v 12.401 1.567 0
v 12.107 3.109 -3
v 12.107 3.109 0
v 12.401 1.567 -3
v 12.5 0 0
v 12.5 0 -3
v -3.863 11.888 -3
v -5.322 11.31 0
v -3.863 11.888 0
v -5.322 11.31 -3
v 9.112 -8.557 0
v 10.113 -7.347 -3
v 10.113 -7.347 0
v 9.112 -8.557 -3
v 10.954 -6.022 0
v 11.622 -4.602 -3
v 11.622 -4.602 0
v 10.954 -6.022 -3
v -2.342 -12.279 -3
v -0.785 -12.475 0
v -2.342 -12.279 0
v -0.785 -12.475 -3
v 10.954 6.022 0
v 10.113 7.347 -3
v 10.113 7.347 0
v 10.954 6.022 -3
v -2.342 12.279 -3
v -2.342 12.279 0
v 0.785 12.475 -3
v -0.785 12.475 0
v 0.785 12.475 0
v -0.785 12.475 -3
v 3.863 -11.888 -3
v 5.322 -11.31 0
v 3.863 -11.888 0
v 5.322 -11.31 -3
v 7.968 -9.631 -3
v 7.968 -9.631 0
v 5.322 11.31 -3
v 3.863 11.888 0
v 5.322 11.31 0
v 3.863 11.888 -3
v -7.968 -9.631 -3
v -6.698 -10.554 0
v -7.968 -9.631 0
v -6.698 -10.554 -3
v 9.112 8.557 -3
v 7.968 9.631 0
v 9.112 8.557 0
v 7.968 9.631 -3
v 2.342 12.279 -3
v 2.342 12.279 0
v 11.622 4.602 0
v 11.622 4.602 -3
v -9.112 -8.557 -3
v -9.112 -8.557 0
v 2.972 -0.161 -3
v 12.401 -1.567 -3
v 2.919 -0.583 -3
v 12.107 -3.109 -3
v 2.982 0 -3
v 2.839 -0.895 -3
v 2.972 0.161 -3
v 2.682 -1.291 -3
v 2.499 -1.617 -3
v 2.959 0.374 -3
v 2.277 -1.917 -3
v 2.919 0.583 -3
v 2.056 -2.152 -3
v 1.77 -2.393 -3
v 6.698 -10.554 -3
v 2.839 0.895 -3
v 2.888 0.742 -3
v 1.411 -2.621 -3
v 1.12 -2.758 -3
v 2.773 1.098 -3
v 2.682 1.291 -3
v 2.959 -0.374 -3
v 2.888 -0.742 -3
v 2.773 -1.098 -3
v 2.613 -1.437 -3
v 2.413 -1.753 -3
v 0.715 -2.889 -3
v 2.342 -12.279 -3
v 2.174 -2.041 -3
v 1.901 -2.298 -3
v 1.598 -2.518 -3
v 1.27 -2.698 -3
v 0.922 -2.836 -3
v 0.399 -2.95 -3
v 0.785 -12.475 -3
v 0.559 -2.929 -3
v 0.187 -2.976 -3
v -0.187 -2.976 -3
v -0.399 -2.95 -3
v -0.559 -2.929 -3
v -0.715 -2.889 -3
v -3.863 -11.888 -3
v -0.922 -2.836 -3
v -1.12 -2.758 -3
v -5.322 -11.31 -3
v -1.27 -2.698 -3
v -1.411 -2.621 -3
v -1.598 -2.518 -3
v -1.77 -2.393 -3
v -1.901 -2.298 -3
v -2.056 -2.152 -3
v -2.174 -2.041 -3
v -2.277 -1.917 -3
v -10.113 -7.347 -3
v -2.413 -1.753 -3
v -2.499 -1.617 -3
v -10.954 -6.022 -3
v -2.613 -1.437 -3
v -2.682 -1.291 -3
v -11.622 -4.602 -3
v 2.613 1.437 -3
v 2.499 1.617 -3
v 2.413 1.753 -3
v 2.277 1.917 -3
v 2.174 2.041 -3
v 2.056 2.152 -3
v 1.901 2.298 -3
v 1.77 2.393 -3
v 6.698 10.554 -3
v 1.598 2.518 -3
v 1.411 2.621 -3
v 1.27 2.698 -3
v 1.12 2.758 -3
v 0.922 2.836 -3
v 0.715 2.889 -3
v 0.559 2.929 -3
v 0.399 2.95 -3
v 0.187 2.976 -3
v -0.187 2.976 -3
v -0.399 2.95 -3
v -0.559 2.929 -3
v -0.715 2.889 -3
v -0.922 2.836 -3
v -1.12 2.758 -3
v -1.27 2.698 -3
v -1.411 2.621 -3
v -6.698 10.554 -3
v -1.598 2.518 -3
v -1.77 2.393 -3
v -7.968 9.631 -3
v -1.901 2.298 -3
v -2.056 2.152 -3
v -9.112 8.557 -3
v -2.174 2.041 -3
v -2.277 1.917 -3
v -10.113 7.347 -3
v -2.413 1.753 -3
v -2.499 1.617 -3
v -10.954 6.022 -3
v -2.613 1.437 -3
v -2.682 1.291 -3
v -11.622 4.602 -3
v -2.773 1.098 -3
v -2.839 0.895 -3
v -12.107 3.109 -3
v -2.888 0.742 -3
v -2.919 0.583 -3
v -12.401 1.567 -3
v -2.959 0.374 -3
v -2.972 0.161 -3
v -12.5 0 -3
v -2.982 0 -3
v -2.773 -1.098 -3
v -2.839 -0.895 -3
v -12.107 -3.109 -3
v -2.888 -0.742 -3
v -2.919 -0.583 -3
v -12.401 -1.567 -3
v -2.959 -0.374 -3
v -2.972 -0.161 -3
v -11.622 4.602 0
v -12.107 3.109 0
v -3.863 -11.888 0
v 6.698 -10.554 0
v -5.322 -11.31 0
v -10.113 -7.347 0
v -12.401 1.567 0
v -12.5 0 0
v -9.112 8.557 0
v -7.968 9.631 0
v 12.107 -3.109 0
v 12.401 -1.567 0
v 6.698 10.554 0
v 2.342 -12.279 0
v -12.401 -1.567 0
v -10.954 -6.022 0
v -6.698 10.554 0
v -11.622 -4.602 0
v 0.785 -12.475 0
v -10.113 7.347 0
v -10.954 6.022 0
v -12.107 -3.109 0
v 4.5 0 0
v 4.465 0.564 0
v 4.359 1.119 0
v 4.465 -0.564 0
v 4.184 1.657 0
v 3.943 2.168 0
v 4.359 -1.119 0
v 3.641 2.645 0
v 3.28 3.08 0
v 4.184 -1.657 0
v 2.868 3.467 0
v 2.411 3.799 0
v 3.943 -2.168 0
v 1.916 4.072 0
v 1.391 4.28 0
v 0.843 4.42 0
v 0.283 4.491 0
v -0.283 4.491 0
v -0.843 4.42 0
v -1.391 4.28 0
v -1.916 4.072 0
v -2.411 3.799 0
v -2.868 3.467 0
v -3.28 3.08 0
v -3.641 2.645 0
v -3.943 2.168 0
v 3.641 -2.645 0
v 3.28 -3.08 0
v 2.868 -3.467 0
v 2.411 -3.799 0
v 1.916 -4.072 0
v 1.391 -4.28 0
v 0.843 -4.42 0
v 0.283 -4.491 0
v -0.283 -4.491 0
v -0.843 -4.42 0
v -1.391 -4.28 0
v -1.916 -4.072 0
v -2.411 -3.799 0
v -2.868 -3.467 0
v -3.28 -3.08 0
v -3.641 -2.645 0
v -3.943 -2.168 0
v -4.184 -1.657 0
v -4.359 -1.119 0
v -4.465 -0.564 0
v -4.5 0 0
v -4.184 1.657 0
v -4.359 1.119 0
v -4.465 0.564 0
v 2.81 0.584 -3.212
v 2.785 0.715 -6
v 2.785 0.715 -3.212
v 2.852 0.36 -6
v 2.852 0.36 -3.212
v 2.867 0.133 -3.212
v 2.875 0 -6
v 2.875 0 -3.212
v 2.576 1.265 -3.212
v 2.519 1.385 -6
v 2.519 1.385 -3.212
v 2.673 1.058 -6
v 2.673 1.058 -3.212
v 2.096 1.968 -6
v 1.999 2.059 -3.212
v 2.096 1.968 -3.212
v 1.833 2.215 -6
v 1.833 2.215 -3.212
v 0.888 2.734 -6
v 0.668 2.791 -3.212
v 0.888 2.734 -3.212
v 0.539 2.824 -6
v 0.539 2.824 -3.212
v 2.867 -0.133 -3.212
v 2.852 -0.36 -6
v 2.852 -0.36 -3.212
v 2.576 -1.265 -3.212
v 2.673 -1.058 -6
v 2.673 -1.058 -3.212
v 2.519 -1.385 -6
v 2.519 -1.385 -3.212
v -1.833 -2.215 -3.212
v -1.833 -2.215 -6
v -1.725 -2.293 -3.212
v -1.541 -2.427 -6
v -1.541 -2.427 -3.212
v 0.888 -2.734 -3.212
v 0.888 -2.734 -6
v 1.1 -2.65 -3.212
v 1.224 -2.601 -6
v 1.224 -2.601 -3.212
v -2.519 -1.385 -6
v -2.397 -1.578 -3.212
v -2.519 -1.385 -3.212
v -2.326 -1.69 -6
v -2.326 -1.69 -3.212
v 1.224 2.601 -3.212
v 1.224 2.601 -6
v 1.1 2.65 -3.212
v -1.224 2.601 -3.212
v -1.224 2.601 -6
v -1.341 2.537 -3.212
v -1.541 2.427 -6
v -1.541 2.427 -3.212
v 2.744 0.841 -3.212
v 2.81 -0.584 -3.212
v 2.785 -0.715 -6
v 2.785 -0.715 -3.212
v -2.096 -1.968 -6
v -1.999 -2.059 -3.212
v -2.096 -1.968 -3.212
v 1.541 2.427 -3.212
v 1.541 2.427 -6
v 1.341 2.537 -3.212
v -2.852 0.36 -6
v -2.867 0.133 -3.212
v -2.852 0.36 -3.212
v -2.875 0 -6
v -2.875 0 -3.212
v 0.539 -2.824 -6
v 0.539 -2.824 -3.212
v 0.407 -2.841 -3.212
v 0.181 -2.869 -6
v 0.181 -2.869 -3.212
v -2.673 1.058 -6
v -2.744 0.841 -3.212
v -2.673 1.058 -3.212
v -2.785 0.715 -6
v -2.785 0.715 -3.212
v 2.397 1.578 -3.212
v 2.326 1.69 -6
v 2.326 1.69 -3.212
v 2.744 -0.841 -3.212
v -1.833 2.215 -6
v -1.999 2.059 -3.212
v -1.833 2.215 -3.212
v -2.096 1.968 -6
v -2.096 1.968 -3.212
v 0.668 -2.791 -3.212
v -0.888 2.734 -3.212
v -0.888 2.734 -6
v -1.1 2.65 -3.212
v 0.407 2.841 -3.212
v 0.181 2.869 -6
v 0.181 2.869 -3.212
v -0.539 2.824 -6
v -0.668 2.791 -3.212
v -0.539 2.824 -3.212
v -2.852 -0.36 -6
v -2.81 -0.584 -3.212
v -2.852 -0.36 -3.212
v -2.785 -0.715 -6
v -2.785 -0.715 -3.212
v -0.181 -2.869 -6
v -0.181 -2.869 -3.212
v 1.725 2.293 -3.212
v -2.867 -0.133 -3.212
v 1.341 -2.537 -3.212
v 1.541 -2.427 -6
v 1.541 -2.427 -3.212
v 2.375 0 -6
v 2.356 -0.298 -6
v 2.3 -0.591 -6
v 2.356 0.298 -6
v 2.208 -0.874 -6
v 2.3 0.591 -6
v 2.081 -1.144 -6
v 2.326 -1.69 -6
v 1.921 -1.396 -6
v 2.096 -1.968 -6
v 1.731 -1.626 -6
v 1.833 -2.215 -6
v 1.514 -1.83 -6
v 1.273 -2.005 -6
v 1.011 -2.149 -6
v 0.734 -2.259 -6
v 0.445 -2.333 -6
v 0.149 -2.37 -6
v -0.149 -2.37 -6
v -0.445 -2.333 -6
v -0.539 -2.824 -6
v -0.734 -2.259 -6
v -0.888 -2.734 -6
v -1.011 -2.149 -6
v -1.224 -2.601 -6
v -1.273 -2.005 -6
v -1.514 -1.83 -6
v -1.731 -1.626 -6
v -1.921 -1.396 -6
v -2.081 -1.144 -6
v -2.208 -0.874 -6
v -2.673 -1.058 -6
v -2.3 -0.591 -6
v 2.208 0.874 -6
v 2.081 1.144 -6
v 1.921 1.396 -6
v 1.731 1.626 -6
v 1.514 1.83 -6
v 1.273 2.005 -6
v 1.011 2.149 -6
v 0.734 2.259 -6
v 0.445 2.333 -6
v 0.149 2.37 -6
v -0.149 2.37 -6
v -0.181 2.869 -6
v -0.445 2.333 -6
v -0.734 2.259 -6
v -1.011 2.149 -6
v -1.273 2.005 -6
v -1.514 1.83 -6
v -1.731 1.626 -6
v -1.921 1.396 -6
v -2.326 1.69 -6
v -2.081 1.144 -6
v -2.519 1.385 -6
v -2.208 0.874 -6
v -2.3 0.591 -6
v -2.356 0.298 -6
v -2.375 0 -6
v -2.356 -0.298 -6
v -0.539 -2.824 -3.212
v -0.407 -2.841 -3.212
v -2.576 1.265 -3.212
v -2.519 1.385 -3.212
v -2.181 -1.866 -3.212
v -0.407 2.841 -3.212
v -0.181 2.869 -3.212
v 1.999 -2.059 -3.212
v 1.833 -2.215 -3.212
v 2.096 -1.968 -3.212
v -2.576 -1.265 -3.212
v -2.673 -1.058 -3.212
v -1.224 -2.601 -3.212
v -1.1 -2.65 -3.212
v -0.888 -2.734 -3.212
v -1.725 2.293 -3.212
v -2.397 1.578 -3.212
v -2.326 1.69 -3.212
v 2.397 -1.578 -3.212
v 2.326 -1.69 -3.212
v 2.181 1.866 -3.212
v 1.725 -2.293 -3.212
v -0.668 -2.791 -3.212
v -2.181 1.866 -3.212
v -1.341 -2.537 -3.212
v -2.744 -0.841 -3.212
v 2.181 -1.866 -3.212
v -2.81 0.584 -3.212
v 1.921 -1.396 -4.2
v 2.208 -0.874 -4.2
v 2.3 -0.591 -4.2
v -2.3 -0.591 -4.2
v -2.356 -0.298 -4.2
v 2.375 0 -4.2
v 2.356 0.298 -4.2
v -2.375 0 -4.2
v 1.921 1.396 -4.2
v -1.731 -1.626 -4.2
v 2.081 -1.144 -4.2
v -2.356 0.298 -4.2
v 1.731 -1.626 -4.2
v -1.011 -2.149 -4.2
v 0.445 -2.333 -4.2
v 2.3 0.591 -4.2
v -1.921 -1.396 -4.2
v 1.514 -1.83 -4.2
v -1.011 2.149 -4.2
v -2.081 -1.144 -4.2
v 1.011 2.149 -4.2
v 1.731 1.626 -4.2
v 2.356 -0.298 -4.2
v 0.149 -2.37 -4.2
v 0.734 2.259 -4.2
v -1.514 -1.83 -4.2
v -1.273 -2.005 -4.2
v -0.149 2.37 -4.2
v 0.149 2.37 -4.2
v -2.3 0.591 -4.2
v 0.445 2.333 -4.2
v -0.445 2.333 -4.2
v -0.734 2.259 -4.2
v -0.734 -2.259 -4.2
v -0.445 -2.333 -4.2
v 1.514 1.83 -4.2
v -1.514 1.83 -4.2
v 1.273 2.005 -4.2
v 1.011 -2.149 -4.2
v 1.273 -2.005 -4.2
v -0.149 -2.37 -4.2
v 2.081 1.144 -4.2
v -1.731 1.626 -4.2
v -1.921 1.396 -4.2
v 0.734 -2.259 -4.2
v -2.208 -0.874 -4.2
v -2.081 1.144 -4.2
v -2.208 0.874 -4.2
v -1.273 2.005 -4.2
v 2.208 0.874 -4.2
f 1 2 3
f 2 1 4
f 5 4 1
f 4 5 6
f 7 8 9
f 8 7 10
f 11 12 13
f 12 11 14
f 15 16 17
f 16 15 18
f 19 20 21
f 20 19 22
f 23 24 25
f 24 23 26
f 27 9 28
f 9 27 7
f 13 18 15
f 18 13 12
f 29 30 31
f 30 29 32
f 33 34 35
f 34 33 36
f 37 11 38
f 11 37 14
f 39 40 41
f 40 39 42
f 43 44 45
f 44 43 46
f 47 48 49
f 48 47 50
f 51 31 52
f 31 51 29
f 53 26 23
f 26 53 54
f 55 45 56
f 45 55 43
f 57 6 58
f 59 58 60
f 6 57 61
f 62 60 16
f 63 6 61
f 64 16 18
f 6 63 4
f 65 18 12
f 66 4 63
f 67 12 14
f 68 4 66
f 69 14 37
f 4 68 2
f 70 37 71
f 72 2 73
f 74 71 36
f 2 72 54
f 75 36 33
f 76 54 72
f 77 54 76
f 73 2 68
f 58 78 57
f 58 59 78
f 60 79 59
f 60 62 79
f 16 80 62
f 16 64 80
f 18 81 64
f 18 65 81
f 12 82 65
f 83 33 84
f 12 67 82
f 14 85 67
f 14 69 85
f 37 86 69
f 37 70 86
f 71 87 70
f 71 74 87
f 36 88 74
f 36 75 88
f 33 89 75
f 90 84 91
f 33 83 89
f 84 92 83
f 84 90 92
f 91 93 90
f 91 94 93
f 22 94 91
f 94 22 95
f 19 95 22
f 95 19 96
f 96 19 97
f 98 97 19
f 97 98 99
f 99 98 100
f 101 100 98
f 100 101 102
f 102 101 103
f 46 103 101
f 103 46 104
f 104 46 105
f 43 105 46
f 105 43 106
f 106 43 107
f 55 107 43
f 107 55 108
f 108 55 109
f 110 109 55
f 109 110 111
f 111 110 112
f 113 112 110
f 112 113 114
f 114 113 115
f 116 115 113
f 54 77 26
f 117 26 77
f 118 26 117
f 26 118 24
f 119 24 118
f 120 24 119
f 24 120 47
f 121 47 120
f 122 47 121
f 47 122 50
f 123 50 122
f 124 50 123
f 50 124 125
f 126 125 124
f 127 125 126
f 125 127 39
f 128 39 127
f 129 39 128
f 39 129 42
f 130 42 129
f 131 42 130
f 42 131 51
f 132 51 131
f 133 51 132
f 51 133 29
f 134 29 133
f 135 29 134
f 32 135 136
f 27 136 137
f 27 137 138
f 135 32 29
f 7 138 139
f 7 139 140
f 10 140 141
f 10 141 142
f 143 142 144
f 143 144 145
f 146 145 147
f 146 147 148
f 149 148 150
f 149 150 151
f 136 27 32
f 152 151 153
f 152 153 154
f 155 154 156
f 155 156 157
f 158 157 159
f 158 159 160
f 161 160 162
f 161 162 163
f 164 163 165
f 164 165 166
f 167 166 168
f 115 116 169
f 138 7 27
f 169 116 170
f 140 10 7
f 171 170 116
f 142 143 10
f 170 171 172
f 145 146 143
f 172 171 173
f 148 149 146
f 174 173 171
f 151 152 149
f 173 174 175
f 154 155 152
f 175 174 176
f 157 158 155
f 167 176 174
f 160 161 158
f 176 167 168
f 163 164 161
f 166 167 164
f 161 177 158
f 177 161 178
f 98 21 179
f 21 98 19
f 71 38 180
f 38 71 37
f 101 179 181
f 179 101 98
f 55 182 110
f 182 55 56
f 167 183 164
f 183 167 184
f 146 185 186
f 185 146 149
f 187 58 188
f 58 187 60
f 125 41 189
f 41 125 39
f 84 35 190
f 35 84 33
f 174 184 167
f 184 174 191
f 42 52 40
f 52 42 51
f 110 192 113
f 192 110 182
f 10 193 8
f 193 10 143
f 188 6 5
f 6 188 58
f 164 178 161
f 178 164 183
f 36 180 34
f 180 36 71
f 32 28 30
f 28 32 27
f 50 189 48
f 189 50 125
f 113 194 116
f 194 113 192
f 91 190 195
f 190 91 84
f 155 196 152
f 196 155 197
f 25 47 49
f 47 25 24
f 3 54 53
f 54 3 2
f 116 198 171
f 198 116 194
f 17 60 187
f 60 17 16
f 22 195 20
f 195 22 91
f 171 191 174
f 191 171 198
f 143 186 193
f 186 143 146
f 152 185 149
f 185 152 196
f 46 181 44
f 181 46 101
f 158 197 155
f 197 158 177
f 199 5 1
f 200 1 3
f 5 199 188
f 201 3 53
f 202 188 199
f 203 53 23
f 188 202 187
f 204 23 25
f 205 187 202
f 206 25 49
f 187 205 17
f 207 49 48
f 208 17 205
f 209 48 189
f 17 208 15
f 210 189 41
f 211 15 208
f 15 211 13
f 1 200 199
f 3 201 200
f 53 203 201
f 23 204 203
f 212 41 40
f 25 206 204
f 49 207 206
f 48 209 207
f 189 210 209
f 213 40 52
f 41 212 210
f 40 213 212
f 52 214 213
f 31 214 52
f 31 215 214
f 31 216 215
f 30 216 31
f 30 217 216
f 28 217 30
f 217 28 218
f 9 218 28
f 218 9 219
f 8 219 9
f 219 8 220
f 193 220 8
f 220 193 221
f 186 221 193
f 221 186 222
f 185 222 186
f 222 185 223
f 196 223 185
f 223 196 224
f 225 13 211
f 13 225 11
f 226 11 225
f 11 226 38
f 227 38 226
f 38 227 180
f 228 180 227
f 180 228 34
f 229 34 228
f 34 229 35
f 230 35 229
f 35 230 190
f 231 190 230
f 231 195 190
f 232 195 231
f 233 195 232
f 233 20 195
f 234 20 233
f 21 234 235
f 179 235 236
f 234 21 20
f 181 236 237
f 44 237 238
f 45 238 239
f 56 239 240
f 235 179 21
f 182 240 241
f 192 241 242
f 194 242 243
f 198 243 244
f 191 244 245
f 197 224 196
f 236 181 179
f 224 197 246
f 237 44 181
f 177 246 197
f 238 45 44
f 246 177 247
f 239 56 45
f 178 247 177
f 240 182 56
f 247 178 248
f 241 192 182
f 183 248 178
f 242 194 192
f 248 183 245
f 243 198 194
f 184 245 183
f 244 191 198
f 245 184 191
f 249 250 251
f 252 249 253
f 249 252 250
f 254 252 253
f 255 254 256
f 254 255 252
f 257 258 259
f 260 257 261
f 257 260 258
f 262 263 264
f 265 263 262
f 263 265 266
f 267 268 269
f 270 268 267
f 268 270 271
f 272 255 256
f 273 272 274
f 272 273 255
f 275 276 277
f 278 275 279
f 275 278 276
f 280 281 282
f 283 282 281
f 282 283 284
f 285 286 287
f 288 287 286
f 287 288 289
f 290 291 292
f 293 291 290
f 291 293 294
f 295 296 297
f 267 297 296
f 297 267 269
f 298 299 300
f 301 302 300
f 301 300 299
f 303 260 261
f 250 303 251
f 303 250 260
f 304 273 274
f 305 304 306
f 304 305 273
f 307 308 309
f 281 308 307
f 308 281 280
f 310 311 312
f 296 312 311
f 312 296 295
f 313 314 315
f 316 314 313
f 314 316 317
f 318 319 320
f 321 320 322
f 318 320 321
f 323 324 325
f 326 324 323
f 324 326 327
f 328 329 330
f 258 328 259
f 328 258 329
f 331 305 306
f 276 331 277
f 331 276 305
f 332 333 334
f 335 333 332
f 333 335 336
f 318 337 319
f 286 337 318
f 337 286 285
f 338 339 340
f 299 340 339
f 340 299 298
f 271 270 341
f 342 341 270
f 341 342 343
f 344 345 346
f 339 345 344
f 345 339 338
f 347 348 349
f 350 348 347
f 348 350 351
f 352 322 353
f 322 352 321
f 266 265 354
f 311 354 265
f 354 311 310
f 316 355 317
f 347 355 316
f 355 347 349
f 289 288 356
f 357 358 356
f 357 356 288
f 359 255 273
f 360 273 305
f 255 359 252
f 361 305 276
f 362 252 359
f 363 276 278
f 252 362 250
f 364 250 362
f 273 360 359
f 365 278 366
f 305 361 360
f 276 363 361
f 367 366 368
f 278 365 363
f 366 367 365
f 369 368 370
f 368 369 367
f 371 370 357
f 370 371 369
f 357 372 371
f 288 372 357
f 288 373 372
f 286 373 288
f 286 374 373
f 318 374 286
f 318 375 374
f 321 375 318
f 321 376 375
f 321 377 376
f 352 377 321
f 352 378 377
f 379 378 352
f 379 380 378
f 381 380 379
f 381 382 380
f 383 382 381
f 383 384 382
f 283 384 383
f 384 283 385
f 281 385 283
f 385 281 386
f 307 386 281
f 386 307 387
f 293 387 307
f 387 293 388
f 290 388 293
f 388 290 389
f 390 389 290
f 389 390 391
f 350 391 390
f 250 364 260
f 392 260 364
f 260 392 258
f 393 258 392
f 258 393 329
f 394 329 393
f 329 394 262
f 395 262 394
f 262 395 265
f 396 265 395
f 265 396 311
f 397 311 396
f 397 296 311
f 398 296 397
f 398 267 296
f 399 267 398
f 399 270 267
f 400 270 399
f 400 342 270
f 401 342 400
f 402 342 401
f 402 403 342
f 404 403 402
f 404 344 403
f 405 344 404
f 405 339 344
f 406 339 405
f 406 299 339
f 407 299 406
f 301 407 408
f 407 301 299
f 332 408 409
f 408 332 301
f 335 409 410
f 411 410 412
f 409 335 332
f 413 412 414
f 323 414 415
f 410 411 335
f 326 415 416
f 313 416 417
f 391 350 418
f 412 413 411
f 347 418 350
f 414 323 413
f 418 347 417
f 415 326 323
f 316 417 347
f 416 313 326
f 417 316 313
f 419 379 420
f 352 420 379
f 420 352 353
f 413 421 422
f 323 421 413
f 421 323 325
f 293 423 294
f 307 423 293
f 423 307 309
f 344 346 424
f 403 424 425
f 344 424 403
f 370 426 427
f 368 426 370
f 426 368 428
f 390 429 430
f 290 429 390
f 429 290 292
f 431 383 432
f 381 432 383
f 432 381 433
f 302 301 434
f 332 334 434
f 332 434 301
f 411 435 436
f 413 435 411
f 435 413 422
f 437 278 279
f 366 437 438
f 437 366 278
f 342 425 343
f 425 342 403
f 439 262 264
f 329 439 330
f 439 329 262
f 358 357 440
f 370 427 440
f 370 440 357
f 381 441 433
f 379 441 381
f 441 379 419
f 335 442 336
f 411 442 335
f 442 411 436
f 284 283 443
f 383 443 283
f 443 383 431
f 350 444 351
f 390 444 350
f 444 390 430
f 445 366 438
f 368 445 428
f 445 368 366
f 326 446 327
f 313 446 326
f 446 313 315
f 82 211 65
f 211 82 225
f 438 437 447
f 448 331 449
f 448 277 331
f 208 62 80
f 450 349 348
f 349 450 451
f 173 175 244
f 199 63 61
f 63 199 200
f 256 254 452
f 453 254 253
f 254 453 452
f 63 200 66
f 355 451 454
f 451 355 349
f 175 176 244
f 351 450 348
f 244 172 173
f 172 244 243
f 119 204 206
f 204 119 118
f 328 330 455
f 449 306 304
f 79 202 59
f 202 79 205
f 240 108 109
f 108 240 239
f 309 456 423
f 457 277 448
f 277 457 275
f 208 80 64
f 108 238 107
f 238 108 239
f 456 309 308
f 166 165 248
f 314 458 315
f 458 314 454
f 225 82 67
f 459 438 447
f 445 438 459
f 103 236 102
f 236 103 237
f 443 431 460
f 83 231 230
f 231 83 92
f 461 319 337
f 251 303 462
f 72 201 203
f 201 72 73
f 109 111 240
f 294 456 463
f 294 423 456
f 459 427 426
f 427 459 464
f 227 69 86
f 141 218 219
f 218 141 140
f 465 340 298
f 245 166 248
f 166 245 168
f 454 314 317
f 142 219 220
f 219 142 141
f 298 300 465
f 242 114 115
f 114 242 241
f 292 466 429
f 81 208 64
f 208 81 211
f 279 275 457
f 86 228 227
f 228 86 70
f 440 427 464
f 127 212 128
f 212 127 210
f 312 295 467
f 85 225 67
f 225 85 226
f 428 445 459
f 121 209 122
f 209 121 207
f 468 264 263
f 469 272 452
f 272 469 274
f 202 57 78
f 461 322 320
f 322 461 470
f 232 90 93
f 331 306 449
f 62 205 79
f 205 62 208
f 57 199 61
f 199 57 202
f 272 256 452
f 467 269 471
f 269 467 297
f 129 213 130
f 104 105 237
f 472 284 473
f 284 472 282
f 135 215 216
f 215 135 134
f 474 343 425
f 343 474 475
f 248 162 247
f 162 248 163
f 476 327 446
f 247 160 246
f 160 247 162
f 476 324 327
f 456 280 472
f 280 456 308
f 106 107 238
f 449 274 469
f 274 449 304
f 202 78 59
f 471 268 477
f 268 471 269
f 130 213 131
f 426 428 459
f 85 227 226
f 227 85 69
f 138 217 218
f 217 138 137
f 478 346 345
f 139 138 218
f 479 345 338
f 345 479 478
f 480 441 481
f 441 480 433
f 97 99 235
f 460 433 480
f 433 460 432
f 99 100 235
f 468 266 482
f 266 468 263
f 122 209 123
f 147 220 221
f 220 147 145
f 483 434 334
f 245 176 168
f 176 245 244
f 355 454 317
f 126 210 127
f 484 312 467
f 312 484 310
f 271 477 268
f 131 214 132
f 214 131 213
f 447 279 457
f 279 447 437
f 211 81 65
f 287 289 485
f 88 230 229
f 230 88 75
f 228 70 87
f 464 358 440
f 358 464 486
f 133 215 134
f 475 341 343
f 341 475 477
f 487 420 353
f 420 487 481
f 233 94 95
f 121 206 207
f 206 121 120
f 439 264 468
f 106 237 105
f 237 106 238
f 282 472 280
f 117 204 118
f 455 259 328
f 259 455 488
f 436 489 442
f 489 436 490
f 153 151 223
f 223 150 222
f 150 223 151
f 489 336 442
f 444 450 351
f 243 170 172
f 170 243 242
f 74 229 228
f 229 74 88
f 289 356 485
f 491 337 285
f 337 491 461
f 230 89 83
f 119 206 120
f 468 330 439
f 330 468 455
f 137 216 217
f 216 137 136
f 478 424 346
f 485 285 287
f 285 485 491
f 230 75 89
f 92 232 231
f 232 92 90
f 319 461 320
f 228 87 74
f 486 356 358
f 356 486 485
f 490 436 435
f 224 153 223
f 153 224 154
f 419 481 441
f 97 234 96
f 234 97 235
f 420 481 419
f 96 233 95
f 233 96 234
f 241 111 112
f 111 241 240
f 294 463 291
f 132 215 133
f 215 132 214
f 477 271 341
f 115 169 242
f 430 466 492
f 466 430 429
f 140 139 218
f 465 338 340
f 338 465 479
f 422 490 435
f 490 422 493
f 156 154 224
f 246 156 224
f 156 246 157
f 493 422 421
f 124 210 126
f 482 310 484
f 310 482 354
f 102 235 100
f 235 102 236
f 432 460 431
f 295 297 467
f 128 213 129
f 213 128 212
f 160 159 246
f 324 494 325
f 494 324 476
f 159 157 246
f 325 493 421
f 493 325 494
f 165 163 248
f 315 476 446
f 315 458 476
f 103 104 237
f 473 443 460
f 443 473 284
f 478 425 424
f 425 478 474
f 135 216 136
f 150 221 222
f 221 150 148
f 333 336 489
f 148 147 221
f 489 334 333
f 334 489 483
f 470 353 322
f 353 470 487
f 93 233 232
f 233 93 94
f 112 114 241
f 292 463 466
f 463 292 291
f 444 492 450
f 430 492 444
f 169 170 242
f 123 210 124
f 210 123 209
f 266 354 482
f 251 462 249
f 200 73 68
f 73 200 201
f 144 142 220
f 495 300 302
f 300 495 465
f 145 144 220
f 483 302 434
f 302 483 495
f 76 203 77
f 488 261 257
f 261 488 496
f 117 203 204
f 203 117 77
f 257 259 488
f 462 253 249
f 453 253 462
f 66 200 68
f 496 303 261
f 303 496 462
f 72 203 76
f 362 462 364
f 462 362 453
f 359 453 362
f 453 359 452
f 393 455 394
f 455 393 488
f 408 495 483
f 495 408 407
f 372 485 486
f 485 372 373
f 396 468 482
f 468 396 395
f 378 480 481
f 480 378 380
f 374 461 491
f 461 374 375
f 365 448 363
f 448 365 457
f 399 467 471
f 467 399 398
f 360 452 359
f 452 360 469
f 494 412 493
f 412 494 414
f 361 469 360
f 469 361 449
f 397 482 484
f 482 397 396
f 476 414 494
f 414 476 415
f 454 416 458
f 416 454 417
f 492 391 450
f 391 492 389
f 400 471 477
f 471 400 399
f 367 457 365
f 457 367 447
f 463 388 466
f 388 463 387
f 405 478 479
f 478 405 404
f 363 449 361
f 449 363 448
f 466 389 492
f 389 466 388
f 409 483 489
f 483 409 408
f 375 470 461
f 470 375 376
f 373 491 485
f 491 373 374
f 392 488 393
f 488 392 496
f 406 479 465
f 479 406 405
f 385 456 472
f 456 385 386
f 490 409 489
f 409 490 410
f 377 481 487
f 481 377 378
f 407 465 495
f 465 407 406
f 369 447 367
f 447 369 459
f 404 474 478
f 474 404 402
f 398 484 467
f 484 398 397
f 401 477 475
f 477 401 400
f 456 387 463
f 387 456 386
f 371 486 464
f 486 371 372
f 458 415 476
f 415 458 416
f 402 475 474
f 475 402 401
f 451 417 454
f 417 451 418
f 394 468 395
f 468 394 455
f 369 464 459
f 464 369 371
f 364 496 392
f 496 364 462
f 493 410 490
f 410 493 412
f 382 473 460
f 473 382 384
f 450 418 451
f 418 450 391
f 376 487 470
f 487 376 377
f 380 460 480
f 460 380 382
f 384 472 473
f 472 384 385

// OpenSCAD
$fn = 50;


difference() {
	union() {
		translate(v = [0, 0, -3.0000000000]) {
			cylinder(h = 3, r = 12.5000000000);
		}
		#translate(v = [0, 0, -6.0000000000]) {
			cylinder(h = 6, r = 2.8750000000);
		}
	}
	union() {
		translate(v = [0, 0, 0]) {
			rotate(a = [0, 0, 0]) {
				difference() {
					union() {
						translate(v = [0, 0, -6.0000000000]) {
							cylinder(h = 6, r = 2.2500000000);
						}
						translate(v = [0, 0, -4.2000000000]) {
							cylinder(h = 4.2000000000, r1 = 2.3750000000, r2 = 4.5000000000);
						}
						translate(v = [0, 0, -6.0000000000]) {
							cylinder(h = 6, r = 2.3750000000);
						}
						translate(v = [0, 0, -6.0000000000]) {
							cylinder(h = 6, r = 2.2500000000);
						}
					}
					union();
				}
			}
		}
	}
}
